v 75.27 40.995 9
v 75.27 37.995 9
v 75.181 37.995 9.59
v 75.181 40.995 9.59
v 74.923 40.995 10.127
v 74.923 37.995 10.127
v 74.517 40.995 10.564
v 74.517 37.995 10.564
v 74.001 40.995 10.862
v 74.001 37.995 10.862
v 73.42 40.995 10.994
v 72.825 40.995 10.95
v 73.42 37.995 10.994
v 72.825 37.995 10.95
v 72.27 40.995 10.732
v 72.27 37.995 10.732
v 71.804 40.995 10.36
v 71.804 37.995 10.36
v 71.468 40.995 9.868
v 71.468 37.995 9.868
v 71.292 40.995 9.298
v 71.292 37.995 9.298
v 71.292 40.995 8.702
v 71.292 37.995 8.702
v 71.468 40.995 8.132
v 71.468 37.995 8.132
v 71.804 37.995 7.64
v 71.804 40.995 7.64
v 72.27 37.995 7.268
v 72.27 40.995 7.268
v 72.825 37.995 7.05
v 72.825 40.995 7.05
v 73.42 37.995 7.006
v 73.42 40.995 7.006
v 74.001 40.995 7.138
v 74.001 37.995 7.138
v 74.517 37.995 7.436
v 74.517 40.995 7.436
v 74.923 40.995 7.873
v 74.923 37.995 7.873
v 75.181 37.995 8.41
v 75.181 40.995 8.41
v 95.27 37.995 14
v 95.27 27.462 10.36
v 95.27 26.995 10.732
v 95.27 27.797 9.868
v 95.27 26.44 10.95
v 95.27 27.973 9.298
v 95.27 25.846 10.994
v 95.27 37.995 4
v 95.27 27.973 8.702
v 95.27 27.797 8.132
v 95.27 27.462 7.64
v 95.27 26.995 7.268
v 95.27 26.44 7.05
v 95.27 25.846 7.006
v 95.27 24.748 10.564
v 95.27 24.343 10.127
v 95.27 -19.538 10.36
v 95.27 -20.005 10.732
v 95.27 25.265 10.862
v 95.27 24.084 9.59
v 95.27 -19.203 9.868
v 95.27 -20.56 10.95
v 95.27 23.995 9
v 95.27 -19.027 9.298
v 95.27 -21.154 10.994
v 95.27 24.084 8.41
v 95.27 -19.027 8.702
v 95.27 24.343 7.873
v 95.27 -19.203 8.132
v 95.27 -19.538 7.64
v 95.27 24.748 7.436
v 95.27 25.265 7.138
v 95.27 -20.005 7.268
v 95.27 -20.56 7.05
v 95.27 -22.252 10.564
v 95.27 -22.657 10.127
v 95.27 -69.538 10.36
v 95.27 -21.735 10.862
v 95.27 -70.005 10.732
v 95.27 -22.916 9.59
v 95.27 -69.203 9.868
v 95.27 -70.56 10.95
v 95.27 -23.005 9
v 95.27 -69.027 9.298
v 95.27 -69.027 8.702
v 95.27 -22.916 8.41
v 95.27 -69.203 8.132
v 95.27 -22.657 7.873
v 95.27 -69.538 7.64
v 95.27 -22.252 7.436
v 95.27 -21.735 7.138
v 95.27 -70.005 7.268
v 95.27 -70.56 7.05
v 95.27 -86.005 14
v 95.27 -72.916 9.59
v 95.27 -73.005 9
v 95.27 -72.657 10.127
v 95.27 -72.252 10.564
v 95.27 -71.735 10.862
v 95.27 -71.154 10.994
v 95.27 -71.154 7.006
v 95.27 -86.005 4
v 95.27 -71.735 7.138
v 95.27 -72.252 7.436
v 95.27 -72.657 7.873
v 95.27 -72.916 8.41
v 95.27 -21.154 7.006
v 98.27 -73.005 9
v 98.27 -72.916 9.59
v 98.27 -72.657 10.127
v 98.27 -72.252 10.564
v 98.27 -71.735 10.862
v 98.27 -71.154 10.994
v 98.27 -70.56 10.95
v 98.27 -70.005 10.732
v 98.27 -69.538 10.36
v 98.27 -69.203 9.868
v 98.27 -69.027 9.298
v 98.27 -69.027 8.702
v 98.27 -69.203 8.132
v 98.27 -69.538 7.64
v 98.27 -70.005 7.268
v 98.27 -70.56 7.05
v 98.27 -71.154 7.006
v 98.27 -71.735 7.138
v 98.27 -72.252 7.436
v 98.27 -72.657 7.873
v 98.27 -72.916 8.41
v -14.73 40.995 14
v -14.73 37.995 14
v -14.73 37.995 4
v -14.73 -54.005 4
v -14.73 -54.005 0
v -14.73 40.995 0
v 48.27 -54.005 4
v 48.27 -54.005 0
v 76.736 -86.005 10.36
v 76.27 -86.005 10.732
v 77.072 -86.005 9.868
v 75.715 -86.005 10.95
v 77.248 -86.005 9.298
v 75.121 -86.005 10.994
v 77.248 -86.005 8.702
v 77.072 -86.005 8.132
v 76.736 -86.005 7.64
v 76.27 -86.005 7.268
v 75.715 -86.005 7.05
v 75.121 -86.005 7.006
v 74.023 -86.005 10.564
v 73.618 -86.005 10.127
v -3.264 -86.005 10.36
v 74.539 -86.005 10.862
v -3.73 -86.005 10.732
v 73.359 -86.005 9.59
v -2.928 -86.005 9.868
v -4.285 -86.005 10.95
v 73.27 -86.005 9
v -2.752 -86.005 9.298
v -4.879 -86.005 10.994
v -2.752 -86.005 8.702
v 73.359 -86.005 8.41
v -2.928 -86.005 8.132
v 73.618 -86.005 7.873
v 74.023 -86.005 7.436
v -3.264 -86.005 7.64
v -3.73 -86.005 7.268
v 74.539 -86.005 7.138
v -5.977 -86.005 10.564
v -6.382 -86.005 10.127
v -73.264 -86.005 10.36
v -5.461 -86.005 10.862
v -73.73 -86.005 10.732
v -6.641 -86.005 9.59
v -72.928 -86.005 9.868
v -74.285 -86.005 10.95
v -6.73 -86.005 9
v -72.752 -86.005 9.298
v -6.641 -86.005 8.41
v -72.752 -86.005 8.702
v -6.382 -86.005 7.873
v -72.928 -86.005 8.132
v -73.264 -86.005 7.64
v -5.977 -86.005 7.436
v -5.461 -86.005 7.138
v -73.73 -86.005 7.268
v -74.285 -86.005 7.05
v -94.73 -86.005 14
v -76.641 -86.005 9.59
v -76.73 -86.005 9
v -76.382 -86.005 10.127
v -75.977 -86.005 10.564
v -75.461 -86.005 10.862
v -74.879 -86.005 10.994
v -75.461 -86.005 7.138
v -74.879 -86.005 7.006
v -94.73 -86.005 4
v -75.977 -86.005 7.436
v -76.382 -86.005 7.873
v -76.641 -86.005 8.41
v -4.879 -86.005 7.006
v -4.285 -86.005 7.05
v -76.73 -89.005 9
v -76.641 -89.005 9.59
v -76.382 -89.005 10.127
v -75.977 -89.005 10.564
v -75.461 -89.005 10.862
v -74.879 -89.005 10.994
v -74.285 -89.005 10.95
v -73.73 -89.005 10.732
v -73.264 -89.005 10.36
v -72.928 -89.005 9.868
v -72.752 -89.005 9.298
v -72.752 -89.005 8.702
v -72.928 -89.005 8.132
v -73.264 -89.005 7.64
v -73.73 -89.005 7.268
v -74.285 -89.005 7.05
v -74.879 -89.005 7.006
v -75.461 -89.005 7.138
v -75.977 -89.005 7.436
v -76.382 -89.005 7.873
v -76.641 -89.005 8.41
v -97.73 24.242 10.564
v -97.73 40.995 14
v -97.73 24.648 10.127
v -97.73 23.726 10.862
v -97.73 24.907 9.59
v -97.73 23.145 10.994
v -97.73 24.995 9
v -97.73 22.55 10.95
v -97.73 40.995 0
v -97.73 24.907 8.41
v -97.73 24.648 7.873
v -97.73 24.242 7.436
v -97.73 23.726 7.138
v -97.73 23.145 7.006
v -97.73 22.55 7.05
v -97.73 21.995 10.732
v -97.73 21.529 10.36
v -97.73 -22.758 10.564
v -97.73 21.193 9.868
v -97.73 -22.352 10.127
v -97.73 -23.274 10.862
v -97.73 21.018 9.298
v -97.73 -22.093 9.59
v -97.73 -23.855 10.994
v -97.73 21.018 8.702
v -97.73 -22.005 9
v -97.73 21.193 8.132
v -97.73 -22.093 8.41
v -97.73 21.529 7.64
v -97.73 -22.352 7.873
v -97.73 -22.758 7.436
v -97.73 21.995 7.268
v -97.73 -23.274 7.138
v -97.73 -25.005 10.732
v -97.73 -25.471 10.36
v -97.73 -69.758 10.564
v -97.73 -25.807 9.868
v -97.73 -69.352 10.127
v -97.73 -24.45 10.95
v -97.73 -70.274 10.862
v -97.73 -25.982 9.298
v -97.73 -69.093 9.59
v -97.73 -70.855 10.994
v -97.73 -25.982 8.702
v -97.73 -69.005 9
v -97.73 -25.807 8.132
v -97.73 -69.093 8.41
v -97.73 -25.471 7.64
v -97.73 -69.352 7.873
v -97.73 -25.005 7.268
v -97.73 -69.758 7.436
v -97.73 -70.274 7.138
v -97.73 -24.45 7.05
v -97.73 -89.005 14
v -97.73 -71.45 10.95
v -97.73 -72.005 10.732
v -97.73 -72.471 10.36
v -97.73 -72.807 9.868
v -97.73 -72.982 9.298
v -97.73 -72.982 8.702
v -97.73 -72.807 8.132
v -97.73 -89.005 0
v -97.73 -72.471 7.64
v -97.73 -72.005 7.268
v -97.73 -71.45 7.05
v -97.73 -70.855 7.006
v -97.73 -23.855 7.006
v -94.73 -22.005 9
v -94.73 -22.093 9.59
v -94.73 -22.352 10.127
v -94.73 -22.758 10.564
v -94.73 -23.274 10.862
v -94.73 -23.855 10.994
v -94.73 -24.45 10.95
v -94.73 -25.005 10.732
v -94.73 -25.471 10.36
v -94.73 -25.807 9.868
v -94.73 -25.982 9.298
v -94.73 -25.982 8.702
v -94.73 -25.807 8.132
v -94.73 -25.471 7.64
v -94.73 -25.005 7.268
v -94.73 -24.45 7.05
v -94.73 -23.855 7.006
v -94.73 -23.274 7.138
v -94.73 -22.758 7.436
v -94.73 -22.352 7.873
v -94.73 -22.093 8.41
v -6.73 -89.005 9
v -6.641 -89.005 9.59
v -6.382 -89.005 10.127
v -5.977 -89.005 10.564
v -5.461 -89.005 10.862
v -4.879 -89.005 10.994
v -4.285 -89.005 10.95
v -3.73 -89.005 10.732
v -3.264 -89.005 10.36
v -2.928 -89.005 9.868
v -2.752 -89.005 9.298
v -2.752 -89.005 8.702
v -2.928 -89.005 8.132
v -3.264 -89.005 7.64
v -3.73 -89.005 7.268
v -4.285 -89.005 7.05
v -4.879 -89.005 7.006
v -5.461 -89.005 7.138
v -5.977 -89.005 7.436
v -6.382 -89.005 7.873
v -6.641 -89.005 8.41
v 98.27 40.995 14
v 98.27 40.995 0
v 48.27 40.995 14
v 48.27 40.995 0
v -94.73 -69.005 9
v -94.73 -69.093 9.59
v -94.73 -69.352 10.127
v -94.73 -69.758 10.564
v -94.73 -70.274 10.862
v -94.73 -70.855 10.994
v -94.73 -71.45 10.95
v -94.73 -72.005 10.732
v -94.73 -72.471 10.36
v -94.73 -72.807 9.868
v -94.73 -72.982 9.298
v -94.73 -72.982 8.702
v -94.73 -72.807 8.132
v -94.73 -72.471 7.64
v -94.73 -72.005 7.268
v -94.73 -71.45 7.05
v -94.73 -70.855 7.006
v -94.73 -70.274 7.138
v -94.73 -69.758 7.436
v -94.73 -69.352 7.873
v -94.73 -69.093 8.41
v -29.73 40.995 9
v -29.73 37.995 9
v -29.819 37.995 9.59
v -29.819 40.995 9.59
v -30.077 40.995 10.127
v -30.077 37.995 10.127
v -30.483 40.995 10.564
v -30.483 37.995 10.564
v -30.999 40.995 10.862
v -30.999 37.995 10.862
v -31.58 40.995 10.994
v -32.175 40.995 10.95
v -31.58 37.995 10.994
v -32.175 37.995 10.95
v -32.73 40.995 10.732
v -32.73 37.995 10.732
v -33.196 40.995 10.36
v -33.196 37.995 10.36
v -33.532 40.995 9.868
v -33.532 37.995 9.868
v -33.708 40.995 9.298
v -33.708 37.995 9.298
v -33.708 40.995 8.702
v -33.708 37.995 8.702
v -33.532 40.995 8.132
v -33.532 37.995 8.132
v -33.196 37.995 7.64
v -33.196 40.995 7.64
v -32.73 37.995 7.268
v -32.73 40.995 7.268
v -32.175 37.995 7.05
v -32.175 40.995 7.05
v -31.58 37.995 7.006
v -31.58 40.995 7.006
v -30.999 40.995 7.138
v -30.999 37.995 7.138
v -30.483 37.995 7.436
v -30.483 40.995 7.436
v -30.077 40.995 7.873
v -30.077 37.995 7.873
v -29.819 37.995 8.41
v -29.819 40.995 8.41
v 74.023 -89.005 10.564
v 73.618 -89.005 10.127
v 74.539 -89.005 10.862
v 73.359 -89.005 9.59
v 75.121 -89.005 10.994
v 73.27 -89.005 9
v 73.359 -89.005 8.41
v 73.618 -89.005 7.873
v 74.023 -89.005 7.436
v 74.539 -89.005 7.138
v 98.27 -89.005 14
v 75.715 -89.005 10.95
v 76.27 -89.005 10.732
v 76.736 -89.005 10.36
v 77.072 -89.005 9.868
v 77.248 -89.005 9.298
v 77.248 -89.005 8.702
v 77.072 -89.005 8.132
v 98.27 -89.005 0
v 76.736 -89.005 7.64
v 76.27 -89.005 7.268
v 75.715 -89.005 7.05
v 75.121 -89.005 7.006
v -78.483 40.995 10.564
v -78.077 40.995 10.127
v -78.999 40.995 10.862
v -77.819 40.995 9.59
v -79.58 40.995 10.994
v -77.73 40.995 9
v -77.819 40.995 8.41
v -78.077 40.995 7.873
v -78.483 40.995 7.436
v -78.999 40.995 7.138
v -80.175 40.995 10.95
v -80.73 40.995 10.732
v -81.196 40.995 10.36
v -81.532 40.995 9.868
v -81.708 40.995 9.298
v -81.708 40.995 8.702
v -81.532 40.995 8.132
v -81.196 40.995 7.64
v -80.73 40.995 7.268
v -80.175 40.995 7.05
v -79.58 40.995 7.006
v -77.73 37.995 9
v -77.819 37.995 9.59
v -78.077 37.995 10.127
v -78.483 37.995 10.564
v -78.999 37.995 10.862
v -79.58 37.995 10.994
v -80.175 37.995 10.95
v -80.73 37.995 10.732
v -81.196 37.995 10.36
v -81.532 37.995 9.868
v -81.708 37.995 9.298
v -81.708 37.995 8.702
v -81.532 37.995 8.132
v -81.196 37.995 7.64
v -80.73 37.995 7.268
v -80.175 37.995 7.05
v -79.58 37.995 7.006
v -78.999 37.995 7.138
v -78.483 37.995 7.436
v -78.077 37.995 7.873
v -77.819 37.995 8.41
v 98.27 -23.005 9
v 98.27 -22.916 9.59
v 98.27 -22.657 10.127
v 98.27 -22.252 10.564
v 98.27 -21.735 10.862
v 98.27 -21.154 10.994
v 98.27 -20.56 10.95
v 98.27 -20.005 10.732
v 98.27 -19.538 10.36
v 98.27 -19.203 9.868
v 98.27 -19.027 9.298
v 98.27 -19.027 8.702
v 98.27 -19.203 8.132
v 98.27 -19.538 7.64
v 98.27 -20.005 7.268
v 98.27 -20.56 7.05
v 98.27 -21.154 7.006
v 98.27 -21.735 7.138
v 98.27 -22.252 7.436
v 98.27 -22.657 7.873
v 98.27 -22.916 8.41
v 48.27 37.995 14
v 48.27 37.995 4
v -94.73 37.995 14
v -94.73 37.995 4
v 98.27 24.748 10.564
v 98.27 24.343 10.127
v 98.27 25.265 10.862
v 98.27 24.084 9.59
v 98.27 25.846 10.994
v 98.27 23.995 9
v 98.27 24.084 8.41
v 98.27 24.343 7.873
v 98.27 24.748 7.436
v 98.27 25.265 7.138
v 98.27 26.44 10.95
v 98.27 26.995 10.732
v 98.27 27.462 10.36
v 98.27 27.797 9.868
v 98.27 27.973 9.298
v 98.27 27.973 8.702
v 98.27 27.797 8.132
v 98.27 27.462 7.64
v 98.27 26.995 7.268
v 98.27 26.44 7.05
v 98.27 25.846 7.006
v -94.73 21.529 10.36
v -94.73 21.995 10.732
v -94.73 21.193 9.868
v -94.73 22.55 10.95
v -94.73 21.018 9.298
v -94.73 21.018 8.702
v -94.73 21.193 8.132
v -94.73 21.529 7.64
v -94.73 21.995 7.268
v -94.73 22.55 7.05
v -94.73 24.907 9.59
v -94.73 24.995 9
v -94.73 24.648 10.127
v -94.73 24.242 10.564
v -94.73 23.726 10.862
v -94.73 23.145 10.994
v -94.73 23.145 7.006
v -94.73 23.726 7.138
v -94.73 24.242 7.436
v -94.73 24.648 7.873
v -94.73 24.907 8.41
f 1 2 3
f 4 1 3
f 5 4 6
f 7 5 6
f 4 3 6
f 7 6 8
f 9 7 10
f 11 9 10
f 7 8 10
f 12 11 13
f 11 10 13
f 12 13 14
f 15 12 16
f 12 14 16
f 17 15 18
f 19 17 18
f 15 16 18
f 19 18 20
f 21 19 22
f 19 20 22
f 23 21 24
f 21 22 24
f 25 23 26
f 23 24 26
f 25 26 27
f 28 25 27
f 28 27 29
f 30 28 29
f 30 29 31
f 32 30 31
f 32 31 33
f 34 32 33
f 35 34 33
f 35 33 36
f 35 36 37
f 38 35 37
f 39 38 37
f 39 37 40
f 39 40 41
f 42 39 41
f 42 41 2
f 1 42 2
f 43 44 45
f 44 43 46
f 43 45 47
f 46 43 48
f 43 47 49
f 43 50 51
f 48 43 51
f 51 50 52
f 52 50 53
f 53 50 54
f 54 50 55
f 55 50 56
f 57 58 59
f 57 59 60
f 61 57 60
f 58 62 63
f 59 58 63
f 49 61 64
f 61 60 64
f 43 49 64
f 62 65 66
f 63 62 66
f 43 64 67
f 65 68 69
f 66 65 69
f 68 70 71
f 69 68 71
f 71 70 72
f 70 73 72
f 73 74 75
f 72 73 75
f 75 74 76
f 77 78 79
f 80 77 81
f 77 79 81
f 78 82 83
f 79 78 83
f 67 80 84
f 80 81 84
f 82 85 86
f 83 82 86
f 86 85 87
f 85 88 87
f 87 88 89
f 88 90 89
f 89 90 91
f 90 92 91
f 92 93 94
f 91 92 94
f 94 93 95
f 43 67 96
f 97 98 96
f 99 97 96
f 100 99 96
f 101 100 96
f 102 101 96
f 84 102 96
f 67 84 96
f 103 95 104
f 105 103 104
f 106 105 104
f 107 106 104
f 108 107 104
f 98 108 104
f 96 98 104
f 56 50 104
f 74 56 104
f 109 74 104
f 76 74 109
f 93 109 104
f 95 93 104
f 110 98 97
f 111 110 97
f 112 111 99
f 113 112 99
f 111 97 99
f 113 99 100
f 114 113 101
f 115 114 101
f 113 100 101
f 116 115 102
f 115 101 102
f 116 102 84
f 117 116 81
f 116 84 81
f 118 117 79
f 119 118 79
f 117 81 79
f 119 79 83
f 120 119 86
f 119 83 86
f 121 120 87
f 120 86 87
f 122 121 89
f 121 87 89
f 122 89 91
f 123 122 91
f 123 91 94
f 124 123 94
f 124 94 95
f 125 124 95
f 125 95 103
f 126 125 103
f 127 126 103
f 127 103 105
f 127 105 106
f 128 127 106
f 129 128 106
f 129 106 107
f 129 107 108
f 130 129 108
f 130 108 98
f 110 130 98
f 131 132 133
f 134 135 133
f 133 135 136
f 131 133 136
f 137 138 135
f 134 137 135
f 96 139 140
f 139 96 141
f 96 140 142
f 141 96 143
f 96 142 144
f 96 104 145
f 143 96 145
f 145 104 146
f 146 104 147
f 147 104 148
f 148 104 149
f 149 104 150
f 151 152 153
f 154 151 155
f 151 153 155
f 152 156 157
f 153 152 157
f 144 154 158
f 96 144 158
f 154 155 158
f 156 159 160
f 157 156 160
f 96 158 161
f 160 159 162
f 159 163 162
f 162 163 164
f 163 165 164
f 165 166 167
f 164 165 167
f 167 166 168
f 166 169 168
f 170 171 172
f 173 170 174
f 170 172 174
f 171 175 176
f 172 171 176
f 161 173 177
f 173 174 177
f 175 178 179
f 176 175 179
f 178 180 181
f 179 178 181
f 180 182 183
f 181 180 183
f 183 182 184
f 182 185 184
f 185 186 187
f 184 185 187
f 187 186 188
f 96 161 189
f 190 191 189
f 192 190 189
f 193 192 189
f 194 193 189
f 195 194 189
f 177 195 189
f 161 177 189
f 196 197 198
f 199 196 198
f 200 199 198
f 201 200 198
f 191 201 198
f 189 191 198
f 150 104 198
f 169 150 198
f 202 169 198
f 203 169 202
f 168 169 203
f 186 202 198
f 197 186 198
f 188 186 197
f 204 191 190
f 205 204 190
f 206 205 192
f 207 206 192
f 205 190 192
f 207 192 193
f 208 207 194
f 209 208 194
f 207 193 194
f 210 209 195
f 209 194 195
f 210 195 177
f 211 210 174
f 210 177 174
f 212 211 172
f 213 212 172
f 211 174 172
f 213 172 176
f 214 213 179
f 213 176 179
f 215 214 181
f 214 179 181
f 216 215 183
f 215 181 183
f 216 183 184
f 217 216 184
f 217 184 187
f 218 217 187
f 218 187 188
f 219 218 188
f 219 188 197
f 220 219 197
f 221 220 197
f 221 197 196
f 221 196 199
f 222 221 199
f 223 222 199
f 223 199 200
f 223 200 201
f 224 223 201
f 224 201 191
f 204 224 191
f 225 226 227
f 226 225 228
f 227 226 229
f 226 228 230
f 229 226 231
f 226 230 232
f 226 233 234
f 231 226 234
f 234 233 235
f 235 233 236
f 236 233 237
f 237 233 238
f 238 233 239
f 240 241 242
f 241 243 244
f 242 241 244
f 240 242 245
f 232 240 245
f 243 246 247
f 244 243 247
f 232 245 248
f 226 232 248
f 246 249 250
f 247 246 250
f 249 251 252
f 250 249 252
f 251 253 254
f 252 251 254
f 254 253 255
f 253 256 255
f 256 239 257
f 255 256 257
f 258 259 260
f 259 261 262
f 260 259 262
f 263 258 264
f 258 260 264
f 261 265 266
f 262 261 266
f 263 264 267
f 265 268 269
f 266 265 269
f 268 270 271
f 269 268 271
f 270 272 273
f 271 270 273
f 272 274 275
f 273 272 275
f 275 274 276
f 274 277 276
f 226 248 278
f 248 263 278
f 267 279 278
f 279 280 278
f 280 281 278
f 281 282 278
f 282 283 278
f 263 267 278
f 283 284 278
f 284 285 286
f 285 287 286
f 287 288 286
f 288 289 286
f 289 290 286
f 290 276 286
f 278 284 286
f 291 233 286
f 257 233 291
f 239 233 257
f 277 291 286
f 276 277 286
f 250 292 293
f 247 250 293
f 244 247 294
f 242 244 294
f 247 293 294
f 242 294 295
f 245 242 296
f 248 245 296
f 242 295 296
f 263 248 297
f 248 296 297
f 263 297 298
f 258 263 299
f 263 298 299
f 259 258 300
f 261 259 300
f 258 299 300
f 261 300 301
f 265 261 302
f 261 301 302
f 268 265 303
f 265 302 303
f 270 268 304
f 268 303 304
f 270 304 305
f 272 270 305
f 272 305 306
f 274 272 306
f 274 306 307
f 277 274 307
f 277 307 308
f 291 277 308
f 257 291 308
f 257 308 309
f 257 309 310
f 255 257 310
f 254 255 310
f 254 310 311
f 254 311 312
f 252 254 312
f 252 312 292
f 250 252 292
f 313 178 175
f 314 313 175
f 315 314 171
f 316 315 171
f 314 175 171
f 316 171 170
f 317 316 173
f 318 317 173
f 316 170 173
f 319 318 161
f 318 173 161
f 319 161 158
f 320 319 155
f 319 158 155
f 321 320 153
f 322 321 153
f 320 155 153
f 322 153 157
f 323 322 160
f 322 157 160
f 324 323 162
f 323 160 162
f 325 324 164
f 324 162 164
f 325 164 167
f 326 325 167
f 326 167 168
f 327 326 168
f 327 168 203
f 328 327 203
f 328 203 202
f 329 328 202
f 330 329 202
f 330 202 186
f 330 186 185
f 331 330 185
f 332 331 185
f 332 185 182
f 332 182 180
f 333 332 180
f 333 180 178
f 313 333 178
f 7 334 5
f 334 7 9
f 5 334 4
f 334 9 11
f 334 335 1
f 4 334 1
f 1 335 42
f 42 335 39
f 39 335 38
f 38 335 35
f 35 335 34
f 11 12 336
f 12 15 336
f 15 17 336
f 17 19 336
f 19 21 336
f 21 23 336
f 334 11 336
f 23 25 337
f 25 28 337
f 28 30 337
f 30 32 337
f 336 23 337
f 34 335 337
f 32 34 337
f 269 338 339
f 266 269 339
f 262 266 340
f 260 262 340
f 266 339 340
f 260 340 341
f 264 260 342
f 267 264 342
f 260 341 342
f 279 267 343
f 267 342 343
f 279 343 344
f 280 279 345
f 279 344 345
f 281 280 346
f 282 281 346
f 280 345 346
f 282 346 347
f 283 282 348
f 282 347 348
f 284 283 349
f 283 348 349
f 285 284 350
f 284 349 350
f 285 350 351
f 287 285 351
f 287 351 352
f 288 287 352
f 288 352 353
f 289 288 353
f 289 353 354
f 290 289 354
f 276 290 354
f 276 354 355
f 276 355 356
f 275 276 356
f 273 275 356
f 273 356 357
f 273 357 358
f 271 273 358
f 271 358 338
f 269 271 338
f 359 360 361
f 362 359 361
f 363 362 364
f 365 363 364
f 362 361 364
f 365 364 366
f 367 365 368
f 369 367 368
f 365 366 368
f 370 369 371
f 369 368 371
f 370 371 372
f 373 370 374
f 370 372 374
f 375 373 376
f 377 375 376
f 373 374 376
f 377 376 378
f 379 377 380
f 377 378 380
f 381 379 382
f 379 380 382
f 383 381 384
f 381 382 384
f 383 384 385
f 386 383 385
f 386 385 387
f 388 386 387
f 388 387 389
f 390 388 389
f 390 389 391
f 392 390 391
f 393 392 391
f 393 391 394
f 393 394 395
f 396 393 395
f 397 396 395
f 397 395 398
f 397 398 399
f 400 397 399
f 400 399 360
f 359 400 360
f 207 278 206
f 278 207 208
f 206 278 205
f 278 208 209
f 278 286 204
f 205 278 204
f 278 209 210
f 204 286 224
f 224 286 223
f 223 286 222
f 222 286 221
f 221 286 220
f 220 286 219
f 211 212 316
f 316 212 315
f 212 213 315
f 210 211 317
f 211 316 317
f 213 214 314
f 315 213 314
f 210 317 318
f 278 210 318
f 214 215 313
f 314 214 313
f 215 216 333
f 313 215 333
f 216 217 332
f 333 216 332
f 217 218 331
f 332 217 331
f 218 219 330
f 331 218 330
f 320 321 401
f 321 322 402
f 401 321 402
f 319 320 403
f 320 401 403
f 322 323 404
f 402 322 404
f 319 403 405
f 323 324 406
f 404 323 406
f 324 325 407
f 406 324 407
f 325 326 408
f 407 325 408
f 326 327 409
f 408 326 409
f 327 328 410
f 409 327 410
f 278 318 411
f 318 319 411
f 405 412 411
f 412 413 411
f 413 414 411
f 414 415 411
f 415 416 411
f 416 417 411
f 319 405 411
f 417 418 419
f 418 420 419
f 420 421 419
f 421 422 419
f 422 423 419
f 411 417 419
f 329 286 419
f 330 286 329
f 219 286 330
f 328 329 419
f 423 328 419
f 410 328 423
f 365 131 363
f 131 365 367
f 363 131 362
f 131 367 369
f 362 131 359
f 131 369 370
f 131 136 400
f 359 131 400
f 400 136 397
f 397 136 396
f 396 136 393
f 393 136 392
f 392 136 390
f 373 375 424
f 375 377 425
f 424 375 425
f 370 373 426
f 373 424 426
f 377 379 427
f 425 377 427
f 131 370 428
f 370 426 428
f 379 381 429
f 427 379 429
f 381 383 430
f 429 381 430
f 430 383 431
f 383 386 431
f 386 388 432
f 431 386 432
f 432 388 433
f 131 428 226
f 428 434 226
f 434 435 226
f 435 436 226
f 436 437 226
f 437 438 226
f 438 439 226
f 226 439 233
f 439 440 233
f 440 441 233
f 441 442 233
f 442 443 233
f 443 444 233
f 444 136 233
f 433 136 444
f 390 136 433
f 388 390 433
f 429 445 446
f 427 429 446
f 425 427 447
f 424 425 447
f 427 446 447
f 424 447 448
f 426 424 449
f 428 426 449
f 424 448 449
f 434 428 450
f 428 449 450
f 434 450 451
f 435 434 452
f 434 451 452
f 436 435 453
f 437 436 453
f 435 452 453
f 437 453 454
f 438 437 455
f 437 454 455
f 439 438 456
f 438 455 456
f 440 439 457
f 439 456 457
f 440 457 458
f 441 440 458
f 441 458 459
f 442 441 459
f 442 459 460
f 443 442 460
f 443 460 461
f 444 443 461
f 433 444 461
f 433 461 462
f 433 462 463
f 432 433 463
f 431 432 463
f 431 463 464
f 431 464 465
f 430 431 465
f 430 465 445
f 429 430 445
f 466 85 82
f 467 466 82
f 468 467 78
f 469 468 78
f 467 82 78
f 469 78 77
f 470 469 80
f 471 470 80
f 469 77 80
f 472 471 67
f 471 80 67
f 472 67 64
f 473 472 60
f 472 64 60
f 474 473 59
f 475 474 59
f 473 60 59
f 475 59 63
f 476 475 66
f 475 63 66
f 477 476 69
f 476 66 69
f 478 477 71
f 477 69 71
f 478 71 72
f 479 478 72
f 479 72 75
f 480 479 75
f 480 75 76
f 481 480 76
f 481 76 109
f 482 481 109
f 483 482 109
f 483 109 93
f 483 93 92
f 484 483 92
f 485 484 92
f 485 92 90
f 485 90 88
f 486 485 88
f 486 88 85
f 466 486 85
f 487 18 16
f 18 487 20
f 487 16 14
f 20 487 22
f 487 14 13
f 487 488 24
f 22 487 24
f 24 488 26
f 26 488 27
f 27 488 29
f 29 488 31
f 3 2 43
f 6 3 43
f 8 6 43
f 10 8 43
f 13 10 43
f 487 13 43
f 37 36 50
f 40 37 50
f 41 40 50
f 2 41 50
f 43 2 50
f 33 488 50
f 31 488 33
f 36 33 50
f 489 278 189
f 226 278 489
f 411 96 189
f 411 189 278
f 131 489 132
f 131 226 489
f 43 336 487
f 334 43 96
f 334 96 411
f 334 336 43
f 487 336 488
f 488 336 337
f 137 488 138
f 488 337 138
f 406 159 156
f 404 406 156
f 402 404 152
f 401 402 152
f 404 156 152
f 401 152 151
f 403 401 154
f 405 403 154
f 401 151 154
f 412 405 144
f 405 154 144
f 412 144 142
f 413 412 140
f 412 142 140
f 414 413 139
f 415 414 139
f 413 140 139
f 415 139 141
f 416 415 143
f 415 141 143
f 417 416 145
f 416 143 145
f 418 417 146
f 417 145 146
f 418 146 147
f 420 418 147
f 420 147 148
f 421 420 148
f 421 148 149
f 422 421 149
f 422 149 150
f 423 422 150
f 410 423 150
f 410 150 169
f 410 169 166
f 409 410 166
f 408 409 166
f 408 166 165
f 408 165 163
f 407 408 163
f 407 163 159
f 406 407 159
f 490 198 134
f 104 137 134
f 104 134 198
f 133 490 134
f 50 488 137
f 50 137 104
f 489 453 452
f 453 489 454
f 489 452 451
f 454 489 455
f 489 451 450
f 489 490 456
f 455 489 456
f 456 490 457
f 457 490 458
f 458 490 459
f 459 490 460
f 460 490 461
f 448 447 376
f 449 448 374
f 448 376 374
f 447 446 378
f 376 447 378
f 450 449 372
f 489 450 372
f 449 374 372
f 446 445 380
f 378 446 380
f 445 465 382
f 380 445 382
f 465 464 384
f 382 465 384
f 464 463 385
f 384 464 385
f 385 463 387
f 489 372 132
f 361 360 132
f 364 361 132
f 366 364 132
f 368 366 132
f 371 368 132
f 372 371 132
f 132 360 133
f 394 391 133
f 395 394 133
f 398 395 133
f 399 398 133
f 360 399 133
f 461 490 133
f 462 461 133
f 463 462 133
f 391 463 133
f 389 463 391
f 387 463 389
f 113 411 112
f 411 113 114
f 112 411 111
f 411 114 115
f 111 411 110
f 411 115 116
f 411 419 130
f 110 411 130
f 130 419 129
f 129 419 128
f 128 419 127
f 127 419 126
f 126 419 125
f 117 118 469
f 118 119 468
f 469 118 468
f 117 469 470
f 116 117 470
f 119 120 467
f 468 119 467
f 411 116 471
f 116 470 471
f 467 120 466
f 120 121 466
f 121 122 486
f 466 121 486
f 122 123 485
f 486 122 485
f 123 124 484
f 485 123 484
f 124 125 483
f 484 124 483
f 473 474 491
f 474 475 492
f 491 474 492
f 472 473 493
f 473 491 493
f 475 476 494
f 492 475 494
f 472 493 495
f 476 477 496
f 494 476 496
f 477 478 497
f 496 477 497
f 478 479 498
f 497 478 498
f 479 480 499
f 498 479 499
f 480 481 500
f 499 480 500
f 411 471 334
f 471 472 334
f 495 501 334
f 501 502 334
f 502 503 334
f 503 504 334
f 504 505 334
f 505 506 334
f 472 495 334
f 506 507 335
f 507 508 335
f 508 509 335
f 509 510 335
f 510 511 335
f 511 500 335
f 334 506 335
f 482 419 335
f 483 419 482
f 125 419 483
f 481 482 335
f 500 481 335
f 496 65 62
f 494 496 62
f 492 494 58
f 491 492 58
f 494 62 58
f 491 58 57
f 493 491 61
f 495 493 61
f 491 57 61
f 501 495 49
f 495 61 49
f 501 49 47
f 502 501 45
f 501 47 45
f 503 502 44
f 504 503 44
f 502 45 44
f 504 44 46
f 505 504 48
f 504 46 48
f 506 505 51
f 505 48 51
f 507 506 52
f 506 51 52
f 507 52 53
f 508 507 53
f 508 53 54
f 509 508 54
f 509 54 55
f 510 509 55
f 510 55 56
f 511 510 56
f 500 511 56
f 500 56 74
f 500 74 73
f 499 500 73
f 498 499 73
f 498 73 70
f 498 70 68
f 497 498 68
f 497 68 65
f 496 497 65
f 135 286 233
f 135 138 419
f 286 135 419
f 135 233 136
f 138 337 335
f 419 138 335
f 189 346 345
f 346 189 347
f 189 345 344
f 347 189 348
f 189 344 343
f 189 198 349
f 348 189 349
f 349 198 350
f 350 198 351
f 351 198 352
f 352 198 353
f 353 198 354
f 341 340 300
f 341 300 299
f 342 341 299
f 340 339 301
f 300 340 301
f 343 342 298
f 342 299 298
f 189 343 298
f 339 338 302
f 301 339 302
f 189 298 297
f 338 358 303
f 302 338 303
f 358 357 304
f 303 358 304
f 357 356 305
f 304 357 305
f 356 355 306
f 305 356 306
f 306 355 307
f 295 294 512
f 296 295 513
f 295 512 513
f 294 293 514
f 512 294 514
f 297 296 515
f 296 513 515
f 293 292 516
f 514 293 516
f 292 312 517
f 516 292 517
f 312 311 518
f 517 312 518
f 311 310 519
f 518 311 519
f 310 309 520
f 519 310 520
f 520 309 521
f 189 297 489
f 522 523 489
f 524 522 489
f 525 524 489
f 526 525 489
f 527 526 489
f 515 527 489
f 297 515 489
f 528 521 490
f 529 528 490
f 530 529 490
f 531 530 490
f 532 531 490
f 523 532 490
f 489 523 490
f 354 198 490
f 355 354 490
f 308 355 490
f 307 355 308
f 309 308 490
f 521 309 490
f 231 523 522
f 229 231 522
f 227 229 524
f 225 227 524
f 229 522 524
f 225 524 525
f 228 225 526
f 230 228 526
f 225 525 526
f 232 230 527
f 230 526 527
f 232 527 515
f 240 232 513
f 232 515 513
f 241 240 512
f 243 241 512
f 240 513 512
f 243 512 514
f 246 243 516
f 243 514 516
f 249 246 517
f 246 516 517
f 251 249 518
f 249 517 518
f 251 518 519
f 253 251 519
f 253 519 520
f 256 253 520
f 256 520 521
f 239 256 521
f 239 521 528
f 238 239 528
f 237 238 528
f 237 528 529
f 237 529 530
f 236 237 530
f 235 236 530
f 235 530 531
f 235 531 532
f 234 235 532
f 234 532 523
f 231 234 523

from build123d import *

# Parameters (mm, degrees)
F1_DEPTH  = 4
F3_DEPTH  = 10
F4_R      = 2
F5_DEPTH  = 5
F7_R      = 2
F8_DEPTH  = 5
F6_R      = 2
F9_DEPTH  = 5
F10_R     = 2
F11_DEPTH = 5


with BuildPart() as f1:
    # F0 (on Top) → F1 (new body)
    with BuildSketch(Plane.XY):
        Polygon((-14.729894, 40.995409), (-97.729894, 40.995409), (-97.729894, -89.004591), (98.270106, -89.004591), (98.270106, 40.995409), (48.270106, 40.995409), (48.270106, -54.004591), (-14.729894, -54.004591), align=None)
    extrude(amount=F1_DEPTH)

    # F2 (on face) → F3 (join)
    with BuildSketch(Plane.XY.offset(4)):
        Polygon((-94.729894, -86.004591), (-94.729894, 37.995409), (-14.729894, 37.995409), (-14.729894, 40.995409), (-97.729894, 40.995409), (-97.729894, -89.004591), (98.270106, -89.004591), (98.270106, 40.995409), (48.270106, 40.995409), (48.270106, 37.995409), (95.270106, 37.995409), (95.270106, -86.004591), align=None)
    extrude(amount=F3_DEPTH)

    # F4 (on face) → F5 (cut)
    with BuildSketch(Plane.YZ.offset(-94.729894)):
        with Locations((22.995409, 9)):
            Circle(F4_R)
        with Locations((-24.004591, 9)):
            Circle(F4_R)
        with Locations((-71.004591, 9)):
            Circle(F4_R)
    extrude(amount=-F5_DEPTH, mode=Mode.SUBTRACT)

    # F7 (on face) → F8 (cut)
    with BuildSketch(Plane(origin=(95.270106, 0, 0), x_dir=(0, -1, 0), z_dir=(-1, 0, 0))):
        with Locations((71.004591, 9)):
            Circle(F7_R)
        with Locations((21.004591, 9)):
            Circle(F7_R)
        with Locations((-25.995409, 9)):
            Circle(F7_R)
    extrude(amount=-F8_DEPTH, mode=Mode.SUBTRACT)

    # F6 (on face) → F9 (cut)
    with BuildSketch(Plane.XZ.offset(-37.995409)):
        with Locations((-79.729894, 9)):
            Circle(F6_R)
        with Locations((-31.729894, 9)):
            Circle(F6_R)
        with Locations((73.270106, 9)):
            Circle(F6_R)
    extrude(amount=-F9_DEPTH, mode=Mode.SUBTRACT)

    # F10 (on face) → F11 (cut)
    with BuildSketch(Plane(origin=(0, -86.004591, 0), x_dir=(-1, 0, 0), z_dir=(0, 1, 0))):
        with Locations((-75.270106, 9)):
            Circle(F10_R)
        with Locations((4.729894, 9)):
            Circle(F10_R)
        with Locations((74.729894, 9)):
            Circle(F10_R)
    extrude(amount=-F11_DEPTH, mode=Mode.SUBTRACT)


solid = f1.part
